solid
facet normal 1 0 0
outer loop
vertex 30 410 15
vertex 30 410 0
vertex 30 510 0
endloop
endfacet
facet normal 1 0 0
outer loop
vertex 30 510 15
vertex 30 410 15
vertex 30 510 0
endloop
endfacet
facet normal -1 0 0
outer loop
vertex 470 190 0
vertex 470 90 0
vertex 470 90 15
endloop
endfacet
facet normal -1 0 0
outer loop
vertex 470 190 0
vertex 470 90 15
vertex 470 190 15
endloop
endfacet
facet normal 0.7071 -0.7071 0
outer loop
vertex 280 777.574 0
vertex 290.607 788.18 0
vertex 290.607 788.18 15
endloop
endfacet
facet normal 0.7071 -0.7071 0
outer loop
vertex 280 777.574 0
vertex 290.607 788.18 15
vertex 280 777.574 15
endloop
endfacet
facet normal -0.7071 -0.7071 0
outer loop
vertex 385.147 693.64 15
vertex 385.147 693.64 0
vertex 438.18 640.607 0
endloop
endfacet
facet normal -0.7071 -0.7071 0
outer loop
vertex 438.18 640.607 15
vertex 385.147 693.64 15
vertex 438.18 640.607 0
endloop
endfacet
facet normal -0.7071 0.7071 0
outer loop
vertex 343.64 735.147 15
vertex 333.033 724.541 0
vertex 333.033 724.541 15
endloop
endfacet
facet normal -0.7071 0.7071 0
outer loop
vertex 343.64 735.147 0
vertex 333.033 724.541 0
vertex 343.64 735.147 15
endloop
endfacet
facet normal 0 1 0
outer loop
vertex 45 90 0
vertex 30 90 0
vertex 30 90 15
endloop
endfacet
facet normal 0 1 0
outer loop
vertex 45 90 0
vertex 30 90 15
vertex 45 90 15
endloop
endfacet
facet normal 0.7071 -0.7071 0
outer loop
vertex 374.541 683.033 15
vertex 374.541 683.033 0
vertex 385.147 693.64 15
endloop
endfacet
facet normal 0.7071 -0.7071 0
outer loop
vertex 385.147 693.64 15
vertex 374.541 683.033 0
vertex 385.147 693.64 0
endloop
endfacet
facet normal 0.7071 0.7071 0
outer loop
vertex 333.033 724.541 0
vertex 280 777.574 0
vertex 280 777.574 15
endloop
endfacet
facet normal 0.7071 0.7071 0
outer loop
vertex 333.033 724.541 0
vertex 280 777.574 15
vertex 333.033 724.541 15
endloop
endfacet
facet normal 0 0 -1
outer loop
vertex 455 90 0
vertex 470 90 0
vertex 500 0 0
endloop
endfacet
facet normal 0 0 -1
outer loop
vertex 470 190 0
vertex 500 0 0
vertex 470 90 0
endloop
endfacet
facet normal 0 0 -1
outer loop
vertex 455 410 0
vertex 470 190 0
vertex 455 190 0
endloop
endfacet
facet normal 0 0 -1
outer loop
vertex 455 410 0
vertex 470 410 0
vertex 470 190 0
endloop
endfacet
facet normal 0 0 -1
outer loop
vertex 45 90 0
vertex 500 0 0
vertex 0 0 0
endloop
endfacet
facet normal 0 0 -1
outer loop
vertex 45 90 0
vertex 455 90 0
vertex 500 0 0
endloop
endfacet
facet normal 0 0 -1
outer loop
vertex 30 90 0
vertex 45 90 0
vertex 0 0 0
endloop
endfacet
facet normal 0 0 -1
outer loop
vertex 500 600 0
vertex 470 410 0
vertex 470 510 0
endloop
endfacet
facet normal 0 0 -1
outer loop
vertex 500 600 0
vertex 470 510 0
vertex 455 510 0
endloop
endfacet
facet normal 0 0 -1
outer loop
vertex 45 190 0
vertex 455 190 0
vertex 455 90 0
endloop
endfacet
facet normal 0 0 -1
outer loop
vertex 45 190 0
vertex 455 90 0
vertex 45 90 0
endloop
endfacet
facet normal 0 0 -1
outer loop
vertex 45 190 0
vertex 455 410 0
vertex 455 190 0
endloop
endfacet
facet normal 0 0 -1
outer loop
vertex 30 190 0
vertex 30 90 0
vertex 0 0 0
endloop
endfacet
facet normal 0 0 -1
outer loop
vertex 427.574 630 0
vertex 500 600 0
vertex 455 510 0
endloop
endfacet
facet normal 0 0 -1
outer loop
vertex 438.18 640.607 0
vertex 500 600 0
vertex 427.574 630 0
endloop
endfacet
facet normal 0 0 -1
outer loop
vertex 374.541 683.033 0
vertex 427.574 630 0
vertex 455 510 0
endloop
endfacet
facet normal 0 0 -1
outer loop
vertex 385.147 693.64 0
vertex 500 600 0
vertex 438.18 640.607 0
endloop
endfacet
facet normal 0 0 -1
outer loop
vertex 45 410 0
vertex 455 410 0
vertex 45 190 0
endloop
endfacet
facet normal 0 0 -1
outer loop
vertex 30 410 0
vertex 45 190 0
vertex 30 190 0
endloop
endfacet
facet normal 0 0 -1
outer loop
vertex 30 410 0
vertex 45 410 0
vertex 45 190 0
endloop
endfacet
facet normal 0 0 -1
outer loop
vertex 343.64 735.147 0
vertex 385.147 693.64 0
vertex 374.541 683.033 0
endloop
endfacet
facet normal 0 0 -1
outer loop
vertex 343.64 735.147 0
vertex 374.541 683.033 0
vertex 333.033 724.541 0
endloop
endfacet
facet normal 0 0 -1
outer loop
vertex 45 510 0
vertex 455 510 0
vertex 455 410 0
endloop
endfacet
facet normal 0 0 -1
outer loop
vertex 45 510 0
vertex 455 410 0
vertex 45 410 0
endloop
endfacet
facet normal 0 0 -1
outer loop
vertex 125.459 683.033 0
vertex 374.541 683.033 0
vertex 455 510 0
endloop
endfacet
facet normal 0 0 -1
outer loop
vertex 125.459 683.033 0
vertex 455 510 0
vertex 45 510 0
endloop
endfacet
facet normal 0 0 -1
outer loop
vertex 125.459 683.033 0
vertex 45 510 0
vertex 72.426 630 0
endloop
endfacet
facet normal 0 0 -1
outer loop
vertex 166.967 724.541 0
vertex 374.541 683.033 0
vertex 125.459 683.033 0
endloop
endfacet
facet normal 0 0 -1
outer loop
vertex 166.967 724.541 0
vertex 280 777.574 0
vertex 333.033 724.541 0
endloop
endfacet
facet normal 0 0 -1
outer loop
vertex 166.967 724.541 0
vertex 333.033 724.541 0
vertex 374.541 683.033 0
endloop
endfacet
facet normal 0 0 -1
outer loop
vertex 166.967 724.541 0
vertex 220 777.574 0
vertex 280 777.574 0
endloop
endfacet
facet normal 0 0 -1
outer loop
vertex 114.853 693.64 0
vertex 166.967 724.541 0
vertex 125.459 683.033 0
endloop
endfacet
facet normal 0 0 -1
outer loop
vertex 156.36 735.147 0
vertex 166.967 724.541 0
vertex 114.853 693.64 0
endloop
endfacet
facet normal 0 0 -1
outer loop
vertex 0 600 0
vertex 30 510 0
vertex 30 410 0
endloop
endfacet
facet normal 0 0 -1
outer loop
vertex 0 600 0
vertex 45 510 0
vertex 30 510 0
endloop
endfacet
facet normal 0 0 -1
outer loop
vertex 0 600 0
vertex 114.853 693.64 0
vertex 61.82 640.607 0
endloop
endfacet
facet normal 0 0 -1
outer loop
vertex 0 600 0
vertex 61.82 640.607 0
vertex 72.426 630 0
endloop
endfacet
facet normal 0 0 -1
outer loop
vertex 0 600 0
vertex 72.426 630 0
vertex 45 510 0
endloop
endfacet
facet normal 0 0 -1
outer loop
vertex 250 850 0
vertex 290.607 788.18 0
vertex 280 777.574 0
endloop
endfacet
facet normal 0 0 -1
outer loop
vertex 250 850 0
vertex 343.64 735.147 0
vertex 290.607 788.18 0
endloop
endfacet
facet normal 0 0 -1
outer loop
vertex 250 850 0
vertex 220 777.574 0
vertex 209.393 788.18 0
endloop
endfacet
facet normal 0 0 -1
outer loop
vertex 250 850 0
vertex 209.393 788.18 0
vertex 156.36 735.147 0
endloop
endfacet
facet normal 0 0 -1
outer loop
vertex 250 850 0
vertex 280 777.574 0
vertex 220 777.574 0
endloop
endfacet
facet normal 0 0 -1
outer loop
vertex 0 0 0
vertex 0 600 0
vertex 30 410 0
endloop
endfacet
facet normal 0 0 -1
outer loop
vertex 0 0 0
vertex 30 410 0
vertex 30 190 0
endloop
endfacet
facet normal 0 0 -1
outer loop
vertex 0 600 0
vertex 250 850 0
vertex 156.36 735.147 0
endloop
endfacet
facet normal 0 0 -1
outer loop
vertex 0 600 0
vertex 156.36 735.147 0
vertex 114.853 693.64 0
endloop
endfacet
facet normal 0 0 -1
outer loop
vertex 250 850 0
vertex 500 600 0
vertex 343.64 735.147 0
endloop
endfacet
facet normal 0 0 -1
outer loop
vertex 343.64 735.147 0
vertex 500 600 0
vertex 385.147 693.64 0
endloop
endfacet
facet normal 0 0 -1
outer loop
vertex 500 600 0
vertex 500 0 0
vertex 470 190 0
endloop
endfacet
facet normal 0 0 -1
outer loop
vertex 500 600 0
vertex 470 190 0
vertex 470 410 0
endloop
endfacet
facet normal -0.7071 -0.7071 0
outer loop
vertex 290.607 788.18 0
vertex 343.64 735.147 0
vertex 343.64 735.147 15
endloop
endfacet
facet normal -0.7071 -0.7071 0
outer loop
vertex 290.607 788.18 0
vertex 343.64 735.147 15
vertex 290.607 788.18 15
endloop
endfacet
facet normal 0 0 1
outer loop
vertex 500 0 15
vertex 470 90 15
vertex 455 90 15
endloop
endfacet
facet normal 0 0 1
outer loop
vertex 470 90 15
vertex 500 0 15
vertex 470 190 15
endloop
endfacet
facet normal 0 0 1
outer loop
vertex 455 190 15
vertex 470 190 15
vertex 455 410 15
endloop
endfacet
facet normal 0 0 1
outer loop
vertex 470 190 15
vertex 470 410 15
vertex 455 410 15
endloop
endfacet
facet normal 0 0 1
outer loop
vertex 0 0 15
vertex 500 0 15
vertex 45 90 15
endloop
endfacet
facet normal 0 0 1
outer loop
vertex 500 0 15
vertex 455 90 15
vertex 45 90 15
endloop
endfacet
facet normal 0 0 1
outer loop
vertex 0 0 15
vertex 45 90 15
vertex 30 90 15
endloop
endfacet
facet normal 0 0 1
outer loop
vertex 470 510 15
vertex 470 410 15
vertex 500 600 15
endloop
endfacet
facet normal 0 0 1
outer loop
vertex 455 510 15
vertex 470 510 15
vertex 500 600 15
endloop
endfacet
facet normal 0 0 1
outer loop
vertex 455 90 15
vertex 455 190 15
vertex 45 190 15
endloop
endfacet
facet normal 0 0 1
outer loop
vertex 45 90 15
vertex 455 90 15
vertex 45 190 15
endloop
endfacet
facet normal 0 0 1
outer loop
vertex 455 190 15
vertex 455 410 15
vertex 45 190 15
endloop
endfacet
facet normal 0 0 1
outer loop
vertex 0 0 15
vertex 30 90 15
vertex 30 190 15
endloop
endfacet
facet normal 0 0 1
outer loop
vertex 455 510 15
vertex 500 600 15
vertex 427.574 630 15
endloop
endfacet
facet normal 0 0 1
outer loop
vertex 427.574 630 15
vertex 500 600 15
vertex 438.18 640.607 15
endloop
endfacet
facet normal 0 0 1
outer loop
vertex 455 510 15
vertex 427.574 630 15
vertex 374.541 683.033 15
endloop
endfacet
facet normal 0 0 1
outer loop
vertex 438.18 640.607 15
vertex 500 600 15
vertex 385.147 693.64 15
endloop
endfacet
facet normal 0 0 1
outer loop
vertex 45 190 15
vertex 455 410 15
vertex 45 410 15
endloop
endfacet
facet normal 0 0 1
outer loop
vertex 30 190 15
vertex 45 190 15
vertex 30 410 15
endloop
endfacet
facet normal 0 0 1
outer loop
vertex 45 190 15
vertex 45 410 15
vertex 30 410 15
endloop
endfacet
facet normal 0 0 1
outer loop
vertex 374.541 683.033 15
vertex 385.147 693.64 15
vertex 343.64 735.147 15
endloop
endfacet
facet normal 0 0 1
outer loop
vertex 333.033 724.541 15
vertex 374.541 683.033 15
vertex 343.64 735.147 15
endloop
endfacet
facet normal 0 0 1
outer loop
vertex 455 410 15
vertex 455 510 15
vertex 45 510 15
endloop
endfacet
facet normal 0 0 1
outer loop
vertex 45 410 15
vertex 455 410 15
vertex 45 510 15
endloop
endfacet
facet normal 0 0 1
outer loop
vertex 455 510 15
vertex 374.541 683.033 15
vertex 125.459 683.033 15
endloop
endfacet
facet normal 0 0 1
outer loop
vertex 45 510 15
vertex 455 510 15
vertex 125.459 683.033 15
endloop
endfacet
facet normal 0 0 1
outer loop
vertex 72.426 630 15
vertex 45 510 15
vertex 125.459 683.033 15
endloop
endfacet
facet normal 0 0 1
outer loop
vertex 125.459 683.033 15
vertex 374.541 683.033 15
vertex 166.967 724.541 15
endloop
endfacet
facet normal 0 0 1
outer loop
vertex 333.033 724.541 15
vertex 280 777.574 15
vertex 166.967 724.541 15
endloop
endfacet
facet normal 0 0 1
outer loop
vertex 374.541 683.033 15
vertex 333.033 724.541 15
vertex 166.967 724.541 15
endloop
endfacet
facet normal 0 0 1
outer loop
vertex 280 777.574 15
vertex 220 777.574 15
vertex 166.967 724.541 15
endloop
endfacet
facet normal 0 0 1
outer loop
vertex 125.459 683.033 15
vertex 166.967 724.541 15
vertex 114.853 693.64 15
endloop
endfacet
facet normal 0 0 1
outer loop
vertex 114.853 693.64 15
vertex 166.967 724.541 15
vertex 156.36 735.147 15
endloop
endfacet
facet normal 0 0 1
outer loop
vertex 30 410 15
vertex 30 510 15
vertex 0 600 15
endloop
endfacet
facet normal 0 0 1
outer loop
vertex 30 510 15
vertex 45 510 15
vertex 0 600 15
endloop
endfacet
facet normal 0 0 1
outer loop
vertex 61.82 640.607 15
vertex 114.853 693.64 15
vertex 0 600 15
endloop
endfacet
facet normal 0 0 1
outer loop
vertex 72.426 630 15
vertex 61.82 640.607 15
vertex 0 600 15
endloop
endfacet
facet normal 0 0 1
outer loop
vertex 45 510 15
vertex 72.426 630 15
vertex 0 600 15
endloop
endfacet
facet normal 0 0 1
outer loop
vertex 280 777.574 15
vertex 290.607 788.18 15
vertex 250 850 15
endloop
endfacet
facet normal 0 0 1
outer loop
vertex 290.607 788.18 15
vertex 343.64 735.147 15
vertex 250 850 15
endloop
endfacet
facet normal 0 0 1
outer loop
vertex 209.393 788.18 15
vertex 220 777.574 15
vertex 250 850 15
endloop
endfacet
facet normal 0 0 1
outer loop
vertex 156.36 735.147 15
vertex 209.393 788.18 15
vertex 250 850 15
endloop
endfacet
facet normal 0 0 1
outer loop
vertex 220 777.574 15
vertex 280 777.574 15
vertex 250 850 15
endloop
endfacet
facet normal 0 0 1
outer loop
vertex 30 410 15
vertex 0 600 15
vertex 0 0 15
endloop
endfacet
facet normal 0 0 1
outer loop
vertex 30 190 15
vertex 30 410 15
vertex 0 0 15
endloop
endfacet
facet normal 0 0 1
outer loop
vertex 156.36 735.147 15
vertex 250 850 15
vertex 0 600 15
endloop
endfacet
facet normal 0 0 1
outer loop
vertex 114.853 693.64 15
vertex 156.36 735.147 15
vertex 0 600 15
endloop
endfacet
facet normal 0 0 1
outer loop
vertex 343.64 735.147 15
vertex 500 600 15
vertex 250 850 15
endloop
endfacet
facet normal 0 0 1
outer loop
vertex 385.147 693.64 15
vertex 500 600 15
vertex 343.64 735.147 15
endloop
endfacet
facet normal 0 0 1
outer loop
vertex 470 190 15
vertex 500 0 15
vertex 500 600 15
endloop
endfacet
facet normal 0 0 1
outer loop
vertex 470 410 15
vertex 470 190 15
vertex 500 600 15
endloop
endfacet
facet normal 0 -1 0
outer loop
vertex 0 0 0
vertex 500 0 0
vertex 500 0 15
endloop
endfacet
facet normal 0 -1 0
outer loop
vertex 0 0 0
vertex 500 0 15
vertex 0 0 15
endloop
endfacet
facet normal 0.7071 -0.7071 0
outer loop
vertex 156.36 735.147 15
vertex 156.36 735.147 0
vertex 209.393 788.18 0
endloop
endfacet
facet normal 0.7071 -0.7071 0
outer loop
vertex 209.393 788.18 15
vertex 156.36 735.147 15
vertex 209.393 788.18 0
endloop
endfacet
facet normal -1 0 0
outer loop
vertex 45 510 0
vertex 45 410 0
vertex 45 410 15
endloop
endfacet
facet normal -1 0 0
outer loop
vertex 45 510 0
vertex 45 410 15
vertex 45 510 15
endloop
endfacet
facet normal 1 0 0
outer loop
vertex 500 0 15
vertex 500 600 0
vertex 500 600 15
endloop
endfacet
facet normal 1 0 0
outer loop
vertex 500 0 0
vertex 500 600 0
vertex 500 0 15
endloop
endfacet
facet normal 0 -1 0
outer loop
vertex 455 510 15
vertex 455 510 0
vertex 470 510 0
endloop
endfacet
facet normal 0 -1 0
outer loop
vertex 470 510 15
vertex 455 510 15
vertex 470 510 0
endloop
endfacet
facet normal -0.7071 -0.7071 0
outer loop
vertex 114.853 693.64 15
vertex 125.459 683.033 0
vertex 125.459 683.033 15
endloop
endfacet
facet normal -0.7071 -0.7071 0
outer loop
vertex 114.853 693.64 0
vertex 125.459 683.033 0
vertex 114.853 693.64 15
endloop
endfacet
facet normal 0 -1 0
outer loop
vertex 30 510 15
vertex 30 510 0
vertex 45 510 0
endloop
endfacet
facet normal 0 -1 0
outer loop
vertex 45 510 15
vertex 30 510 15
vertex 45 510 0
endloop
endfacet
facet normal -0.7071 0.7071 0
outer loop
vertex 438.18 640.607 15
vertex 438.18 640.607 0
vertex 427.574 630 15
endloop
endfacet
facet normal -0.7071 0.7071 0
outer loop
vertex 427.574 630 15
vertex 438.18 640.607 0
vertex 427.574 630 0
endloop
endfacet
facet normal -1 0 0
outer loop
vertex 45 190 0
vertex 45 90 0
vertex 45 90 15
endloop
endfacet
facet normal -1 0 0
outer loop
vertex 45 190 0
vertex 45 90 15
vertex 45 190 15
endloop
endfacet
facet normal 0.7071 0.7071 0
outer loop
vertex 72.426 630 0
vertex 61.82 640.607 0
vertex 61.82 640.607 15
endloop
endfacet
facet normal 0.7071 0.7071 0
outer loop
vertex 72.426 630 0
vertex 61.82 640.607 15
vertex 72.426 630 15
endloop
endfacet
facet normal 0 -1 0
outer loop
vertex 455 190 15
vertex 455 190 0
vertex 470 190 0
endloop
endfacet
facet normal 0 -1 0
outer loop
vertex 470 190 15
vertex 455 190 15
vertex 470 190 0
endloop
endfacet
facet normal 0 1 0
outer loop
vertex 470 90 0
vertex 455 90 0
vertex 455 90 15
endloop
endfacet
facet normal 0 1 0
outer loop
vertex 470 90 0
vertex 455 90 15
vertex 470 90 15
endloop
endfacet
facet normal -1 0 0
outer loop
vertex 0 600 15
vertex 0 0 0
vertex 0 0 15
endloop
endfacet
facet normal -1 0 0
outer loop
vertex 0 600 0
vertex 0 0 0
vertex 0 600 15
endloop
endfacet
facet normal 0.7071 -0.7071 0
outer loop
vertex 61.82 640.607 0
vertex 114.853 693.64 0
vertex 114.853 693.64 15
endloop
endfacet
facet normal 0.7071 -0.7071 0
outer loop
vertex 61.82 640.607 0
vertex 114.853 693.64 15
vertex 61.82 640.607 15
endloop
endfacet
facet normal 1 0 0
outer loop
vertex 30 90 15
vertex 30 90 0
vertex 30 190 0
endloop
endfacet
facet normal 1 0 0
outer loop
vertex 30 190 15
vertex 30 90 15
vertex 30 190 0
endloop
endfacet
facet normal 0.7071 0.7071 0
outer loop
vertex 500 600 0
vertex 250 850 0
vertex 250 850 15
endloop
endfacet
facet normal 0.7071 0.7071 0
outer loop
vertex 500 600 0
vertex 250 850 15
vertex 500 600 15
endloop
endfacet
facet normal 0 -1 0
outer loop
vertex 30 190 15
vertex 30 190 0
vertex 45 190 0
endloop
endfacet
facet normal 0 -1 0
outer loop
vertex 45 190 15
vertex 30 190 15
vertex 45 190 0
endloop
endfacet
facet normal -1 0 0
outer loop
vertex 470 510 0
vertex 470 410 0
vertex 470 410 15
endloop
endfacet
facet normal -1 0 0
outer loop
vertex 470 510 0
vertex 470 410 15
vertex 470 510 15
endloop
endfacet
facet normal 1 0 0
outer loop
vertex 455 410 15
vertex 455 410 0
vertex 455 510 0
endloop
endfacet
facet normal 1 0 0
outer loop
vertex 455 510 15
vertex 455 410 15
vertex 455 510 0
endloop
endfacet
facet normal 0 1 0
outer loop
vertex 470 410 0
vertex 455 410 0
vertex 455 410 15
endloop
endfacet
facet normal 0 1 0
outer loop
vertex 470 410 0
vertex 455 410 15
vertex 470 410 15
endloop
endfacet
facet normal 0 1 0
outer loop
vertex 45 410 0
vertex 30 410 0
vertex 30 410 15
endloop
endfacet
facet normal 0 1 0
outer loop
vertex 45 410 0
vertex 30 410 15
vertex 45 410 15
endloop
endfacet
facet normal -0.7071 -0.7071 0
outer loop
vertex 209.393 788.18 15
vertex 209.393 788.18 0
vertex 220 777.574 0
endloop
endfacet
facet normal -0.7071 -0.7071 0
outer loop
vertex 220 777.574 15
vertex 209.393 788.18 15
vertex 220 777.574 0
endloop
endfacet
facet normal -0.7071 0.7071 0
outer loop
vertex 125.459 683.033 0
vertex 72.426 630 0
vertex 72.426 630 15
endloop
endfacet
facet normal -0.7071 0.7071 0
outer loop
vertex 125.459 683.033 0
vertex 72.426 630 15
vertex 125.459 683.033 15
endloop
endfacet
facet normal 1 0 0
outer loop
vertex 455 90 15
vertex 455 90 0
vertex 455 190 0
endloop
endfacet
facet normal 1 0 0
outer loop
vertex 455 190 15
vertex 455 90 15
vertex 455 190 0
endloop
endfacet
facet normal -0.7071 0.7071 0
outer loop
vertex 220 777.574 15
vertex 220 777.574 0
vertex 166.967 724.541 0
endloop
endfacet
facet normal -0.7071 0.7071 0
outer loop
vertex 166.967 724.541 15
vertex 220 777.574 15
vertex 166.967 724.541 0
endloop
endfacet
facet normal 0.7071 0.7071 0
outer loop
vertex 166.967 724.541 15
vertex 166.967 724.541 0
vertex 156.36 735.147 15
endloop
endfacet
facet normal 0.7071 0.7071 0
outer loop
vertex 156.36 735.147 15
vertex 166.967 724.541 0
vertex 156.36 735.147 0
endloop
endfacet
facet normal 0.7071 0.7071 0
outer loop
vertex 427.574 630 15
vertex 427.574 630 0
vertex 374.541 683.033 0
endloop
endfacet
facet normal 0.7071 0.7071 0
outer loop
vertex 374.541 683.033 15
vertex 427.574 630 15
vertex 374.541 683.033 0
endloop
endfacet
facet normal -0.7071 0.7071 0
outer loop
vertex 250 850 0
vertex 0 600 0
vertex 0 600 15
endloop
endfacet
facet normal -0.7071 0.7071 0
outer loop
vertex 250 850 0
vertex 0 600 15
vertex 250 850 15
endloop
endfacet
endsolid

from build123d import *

# Parameters (mm, degrees)
SKETCH1_W           = 15
SKETCH1_H           = 100
BOSS_EXTRUDE1_DEPTH = 15


with BuildPart() as part:
    # Sketch1 → Boss-Extrude1 (new body)
    with BuildSketch(Plane.XY):
        Polygon((0, 0), (0, 600), (250, 850), (500, 600), (500, 0), align=None)
        with Locations((37.5, 460)):
            Rectangle(SKETCH1_W, SKETCH1_H, mode=Mode.SUBTRACT)
        with Locations((462.5, 460)):
            Rectangle(SKETCH1_W, SKETCH1_H, mode=Mode.SUBTRACT)
        with Locations((462.5, 140)):
            Rectangle(SKETCH1_W, SKETCH1_H, mode=Mode.SUBTRACT)
        with Locations((37.5, 140)):
            Rectangle(SKETCH1_W, SKETCH1_H, mode=Mode.SUBTRACT)
        Polygon((61.819805153, 640.606601718), (72.426406871, 630), (125.45941546, 683.033008589), (114.852813742, 693.639610307), align=None, mode=Mode.SUBTRACT)
        Polygon((166.966991411, 724.54058454), (156.360389693, 735.147186258), (209.393398282, 788.180194847), (220, 777.573593129), align=None, mode=Mode.SUBTRACT)
        Polygon((280, 777.573593129), (333.033008589, 724.54058454), (343.639610307, 735.147186258), (290.606601718, 788.180194847), align=None, mode=Mode.SUBTRACT)
        Polygon((374.54058454, 683.033008589), (385.147186258, 693.639610307), (438.180194847, 640.606601718), (427.573593129, 630), align=None, mode=Mode.SUBTRACT)
    extrude(amount=BOSS_EXTRUDE1_DEPTH)


solid = part.part
